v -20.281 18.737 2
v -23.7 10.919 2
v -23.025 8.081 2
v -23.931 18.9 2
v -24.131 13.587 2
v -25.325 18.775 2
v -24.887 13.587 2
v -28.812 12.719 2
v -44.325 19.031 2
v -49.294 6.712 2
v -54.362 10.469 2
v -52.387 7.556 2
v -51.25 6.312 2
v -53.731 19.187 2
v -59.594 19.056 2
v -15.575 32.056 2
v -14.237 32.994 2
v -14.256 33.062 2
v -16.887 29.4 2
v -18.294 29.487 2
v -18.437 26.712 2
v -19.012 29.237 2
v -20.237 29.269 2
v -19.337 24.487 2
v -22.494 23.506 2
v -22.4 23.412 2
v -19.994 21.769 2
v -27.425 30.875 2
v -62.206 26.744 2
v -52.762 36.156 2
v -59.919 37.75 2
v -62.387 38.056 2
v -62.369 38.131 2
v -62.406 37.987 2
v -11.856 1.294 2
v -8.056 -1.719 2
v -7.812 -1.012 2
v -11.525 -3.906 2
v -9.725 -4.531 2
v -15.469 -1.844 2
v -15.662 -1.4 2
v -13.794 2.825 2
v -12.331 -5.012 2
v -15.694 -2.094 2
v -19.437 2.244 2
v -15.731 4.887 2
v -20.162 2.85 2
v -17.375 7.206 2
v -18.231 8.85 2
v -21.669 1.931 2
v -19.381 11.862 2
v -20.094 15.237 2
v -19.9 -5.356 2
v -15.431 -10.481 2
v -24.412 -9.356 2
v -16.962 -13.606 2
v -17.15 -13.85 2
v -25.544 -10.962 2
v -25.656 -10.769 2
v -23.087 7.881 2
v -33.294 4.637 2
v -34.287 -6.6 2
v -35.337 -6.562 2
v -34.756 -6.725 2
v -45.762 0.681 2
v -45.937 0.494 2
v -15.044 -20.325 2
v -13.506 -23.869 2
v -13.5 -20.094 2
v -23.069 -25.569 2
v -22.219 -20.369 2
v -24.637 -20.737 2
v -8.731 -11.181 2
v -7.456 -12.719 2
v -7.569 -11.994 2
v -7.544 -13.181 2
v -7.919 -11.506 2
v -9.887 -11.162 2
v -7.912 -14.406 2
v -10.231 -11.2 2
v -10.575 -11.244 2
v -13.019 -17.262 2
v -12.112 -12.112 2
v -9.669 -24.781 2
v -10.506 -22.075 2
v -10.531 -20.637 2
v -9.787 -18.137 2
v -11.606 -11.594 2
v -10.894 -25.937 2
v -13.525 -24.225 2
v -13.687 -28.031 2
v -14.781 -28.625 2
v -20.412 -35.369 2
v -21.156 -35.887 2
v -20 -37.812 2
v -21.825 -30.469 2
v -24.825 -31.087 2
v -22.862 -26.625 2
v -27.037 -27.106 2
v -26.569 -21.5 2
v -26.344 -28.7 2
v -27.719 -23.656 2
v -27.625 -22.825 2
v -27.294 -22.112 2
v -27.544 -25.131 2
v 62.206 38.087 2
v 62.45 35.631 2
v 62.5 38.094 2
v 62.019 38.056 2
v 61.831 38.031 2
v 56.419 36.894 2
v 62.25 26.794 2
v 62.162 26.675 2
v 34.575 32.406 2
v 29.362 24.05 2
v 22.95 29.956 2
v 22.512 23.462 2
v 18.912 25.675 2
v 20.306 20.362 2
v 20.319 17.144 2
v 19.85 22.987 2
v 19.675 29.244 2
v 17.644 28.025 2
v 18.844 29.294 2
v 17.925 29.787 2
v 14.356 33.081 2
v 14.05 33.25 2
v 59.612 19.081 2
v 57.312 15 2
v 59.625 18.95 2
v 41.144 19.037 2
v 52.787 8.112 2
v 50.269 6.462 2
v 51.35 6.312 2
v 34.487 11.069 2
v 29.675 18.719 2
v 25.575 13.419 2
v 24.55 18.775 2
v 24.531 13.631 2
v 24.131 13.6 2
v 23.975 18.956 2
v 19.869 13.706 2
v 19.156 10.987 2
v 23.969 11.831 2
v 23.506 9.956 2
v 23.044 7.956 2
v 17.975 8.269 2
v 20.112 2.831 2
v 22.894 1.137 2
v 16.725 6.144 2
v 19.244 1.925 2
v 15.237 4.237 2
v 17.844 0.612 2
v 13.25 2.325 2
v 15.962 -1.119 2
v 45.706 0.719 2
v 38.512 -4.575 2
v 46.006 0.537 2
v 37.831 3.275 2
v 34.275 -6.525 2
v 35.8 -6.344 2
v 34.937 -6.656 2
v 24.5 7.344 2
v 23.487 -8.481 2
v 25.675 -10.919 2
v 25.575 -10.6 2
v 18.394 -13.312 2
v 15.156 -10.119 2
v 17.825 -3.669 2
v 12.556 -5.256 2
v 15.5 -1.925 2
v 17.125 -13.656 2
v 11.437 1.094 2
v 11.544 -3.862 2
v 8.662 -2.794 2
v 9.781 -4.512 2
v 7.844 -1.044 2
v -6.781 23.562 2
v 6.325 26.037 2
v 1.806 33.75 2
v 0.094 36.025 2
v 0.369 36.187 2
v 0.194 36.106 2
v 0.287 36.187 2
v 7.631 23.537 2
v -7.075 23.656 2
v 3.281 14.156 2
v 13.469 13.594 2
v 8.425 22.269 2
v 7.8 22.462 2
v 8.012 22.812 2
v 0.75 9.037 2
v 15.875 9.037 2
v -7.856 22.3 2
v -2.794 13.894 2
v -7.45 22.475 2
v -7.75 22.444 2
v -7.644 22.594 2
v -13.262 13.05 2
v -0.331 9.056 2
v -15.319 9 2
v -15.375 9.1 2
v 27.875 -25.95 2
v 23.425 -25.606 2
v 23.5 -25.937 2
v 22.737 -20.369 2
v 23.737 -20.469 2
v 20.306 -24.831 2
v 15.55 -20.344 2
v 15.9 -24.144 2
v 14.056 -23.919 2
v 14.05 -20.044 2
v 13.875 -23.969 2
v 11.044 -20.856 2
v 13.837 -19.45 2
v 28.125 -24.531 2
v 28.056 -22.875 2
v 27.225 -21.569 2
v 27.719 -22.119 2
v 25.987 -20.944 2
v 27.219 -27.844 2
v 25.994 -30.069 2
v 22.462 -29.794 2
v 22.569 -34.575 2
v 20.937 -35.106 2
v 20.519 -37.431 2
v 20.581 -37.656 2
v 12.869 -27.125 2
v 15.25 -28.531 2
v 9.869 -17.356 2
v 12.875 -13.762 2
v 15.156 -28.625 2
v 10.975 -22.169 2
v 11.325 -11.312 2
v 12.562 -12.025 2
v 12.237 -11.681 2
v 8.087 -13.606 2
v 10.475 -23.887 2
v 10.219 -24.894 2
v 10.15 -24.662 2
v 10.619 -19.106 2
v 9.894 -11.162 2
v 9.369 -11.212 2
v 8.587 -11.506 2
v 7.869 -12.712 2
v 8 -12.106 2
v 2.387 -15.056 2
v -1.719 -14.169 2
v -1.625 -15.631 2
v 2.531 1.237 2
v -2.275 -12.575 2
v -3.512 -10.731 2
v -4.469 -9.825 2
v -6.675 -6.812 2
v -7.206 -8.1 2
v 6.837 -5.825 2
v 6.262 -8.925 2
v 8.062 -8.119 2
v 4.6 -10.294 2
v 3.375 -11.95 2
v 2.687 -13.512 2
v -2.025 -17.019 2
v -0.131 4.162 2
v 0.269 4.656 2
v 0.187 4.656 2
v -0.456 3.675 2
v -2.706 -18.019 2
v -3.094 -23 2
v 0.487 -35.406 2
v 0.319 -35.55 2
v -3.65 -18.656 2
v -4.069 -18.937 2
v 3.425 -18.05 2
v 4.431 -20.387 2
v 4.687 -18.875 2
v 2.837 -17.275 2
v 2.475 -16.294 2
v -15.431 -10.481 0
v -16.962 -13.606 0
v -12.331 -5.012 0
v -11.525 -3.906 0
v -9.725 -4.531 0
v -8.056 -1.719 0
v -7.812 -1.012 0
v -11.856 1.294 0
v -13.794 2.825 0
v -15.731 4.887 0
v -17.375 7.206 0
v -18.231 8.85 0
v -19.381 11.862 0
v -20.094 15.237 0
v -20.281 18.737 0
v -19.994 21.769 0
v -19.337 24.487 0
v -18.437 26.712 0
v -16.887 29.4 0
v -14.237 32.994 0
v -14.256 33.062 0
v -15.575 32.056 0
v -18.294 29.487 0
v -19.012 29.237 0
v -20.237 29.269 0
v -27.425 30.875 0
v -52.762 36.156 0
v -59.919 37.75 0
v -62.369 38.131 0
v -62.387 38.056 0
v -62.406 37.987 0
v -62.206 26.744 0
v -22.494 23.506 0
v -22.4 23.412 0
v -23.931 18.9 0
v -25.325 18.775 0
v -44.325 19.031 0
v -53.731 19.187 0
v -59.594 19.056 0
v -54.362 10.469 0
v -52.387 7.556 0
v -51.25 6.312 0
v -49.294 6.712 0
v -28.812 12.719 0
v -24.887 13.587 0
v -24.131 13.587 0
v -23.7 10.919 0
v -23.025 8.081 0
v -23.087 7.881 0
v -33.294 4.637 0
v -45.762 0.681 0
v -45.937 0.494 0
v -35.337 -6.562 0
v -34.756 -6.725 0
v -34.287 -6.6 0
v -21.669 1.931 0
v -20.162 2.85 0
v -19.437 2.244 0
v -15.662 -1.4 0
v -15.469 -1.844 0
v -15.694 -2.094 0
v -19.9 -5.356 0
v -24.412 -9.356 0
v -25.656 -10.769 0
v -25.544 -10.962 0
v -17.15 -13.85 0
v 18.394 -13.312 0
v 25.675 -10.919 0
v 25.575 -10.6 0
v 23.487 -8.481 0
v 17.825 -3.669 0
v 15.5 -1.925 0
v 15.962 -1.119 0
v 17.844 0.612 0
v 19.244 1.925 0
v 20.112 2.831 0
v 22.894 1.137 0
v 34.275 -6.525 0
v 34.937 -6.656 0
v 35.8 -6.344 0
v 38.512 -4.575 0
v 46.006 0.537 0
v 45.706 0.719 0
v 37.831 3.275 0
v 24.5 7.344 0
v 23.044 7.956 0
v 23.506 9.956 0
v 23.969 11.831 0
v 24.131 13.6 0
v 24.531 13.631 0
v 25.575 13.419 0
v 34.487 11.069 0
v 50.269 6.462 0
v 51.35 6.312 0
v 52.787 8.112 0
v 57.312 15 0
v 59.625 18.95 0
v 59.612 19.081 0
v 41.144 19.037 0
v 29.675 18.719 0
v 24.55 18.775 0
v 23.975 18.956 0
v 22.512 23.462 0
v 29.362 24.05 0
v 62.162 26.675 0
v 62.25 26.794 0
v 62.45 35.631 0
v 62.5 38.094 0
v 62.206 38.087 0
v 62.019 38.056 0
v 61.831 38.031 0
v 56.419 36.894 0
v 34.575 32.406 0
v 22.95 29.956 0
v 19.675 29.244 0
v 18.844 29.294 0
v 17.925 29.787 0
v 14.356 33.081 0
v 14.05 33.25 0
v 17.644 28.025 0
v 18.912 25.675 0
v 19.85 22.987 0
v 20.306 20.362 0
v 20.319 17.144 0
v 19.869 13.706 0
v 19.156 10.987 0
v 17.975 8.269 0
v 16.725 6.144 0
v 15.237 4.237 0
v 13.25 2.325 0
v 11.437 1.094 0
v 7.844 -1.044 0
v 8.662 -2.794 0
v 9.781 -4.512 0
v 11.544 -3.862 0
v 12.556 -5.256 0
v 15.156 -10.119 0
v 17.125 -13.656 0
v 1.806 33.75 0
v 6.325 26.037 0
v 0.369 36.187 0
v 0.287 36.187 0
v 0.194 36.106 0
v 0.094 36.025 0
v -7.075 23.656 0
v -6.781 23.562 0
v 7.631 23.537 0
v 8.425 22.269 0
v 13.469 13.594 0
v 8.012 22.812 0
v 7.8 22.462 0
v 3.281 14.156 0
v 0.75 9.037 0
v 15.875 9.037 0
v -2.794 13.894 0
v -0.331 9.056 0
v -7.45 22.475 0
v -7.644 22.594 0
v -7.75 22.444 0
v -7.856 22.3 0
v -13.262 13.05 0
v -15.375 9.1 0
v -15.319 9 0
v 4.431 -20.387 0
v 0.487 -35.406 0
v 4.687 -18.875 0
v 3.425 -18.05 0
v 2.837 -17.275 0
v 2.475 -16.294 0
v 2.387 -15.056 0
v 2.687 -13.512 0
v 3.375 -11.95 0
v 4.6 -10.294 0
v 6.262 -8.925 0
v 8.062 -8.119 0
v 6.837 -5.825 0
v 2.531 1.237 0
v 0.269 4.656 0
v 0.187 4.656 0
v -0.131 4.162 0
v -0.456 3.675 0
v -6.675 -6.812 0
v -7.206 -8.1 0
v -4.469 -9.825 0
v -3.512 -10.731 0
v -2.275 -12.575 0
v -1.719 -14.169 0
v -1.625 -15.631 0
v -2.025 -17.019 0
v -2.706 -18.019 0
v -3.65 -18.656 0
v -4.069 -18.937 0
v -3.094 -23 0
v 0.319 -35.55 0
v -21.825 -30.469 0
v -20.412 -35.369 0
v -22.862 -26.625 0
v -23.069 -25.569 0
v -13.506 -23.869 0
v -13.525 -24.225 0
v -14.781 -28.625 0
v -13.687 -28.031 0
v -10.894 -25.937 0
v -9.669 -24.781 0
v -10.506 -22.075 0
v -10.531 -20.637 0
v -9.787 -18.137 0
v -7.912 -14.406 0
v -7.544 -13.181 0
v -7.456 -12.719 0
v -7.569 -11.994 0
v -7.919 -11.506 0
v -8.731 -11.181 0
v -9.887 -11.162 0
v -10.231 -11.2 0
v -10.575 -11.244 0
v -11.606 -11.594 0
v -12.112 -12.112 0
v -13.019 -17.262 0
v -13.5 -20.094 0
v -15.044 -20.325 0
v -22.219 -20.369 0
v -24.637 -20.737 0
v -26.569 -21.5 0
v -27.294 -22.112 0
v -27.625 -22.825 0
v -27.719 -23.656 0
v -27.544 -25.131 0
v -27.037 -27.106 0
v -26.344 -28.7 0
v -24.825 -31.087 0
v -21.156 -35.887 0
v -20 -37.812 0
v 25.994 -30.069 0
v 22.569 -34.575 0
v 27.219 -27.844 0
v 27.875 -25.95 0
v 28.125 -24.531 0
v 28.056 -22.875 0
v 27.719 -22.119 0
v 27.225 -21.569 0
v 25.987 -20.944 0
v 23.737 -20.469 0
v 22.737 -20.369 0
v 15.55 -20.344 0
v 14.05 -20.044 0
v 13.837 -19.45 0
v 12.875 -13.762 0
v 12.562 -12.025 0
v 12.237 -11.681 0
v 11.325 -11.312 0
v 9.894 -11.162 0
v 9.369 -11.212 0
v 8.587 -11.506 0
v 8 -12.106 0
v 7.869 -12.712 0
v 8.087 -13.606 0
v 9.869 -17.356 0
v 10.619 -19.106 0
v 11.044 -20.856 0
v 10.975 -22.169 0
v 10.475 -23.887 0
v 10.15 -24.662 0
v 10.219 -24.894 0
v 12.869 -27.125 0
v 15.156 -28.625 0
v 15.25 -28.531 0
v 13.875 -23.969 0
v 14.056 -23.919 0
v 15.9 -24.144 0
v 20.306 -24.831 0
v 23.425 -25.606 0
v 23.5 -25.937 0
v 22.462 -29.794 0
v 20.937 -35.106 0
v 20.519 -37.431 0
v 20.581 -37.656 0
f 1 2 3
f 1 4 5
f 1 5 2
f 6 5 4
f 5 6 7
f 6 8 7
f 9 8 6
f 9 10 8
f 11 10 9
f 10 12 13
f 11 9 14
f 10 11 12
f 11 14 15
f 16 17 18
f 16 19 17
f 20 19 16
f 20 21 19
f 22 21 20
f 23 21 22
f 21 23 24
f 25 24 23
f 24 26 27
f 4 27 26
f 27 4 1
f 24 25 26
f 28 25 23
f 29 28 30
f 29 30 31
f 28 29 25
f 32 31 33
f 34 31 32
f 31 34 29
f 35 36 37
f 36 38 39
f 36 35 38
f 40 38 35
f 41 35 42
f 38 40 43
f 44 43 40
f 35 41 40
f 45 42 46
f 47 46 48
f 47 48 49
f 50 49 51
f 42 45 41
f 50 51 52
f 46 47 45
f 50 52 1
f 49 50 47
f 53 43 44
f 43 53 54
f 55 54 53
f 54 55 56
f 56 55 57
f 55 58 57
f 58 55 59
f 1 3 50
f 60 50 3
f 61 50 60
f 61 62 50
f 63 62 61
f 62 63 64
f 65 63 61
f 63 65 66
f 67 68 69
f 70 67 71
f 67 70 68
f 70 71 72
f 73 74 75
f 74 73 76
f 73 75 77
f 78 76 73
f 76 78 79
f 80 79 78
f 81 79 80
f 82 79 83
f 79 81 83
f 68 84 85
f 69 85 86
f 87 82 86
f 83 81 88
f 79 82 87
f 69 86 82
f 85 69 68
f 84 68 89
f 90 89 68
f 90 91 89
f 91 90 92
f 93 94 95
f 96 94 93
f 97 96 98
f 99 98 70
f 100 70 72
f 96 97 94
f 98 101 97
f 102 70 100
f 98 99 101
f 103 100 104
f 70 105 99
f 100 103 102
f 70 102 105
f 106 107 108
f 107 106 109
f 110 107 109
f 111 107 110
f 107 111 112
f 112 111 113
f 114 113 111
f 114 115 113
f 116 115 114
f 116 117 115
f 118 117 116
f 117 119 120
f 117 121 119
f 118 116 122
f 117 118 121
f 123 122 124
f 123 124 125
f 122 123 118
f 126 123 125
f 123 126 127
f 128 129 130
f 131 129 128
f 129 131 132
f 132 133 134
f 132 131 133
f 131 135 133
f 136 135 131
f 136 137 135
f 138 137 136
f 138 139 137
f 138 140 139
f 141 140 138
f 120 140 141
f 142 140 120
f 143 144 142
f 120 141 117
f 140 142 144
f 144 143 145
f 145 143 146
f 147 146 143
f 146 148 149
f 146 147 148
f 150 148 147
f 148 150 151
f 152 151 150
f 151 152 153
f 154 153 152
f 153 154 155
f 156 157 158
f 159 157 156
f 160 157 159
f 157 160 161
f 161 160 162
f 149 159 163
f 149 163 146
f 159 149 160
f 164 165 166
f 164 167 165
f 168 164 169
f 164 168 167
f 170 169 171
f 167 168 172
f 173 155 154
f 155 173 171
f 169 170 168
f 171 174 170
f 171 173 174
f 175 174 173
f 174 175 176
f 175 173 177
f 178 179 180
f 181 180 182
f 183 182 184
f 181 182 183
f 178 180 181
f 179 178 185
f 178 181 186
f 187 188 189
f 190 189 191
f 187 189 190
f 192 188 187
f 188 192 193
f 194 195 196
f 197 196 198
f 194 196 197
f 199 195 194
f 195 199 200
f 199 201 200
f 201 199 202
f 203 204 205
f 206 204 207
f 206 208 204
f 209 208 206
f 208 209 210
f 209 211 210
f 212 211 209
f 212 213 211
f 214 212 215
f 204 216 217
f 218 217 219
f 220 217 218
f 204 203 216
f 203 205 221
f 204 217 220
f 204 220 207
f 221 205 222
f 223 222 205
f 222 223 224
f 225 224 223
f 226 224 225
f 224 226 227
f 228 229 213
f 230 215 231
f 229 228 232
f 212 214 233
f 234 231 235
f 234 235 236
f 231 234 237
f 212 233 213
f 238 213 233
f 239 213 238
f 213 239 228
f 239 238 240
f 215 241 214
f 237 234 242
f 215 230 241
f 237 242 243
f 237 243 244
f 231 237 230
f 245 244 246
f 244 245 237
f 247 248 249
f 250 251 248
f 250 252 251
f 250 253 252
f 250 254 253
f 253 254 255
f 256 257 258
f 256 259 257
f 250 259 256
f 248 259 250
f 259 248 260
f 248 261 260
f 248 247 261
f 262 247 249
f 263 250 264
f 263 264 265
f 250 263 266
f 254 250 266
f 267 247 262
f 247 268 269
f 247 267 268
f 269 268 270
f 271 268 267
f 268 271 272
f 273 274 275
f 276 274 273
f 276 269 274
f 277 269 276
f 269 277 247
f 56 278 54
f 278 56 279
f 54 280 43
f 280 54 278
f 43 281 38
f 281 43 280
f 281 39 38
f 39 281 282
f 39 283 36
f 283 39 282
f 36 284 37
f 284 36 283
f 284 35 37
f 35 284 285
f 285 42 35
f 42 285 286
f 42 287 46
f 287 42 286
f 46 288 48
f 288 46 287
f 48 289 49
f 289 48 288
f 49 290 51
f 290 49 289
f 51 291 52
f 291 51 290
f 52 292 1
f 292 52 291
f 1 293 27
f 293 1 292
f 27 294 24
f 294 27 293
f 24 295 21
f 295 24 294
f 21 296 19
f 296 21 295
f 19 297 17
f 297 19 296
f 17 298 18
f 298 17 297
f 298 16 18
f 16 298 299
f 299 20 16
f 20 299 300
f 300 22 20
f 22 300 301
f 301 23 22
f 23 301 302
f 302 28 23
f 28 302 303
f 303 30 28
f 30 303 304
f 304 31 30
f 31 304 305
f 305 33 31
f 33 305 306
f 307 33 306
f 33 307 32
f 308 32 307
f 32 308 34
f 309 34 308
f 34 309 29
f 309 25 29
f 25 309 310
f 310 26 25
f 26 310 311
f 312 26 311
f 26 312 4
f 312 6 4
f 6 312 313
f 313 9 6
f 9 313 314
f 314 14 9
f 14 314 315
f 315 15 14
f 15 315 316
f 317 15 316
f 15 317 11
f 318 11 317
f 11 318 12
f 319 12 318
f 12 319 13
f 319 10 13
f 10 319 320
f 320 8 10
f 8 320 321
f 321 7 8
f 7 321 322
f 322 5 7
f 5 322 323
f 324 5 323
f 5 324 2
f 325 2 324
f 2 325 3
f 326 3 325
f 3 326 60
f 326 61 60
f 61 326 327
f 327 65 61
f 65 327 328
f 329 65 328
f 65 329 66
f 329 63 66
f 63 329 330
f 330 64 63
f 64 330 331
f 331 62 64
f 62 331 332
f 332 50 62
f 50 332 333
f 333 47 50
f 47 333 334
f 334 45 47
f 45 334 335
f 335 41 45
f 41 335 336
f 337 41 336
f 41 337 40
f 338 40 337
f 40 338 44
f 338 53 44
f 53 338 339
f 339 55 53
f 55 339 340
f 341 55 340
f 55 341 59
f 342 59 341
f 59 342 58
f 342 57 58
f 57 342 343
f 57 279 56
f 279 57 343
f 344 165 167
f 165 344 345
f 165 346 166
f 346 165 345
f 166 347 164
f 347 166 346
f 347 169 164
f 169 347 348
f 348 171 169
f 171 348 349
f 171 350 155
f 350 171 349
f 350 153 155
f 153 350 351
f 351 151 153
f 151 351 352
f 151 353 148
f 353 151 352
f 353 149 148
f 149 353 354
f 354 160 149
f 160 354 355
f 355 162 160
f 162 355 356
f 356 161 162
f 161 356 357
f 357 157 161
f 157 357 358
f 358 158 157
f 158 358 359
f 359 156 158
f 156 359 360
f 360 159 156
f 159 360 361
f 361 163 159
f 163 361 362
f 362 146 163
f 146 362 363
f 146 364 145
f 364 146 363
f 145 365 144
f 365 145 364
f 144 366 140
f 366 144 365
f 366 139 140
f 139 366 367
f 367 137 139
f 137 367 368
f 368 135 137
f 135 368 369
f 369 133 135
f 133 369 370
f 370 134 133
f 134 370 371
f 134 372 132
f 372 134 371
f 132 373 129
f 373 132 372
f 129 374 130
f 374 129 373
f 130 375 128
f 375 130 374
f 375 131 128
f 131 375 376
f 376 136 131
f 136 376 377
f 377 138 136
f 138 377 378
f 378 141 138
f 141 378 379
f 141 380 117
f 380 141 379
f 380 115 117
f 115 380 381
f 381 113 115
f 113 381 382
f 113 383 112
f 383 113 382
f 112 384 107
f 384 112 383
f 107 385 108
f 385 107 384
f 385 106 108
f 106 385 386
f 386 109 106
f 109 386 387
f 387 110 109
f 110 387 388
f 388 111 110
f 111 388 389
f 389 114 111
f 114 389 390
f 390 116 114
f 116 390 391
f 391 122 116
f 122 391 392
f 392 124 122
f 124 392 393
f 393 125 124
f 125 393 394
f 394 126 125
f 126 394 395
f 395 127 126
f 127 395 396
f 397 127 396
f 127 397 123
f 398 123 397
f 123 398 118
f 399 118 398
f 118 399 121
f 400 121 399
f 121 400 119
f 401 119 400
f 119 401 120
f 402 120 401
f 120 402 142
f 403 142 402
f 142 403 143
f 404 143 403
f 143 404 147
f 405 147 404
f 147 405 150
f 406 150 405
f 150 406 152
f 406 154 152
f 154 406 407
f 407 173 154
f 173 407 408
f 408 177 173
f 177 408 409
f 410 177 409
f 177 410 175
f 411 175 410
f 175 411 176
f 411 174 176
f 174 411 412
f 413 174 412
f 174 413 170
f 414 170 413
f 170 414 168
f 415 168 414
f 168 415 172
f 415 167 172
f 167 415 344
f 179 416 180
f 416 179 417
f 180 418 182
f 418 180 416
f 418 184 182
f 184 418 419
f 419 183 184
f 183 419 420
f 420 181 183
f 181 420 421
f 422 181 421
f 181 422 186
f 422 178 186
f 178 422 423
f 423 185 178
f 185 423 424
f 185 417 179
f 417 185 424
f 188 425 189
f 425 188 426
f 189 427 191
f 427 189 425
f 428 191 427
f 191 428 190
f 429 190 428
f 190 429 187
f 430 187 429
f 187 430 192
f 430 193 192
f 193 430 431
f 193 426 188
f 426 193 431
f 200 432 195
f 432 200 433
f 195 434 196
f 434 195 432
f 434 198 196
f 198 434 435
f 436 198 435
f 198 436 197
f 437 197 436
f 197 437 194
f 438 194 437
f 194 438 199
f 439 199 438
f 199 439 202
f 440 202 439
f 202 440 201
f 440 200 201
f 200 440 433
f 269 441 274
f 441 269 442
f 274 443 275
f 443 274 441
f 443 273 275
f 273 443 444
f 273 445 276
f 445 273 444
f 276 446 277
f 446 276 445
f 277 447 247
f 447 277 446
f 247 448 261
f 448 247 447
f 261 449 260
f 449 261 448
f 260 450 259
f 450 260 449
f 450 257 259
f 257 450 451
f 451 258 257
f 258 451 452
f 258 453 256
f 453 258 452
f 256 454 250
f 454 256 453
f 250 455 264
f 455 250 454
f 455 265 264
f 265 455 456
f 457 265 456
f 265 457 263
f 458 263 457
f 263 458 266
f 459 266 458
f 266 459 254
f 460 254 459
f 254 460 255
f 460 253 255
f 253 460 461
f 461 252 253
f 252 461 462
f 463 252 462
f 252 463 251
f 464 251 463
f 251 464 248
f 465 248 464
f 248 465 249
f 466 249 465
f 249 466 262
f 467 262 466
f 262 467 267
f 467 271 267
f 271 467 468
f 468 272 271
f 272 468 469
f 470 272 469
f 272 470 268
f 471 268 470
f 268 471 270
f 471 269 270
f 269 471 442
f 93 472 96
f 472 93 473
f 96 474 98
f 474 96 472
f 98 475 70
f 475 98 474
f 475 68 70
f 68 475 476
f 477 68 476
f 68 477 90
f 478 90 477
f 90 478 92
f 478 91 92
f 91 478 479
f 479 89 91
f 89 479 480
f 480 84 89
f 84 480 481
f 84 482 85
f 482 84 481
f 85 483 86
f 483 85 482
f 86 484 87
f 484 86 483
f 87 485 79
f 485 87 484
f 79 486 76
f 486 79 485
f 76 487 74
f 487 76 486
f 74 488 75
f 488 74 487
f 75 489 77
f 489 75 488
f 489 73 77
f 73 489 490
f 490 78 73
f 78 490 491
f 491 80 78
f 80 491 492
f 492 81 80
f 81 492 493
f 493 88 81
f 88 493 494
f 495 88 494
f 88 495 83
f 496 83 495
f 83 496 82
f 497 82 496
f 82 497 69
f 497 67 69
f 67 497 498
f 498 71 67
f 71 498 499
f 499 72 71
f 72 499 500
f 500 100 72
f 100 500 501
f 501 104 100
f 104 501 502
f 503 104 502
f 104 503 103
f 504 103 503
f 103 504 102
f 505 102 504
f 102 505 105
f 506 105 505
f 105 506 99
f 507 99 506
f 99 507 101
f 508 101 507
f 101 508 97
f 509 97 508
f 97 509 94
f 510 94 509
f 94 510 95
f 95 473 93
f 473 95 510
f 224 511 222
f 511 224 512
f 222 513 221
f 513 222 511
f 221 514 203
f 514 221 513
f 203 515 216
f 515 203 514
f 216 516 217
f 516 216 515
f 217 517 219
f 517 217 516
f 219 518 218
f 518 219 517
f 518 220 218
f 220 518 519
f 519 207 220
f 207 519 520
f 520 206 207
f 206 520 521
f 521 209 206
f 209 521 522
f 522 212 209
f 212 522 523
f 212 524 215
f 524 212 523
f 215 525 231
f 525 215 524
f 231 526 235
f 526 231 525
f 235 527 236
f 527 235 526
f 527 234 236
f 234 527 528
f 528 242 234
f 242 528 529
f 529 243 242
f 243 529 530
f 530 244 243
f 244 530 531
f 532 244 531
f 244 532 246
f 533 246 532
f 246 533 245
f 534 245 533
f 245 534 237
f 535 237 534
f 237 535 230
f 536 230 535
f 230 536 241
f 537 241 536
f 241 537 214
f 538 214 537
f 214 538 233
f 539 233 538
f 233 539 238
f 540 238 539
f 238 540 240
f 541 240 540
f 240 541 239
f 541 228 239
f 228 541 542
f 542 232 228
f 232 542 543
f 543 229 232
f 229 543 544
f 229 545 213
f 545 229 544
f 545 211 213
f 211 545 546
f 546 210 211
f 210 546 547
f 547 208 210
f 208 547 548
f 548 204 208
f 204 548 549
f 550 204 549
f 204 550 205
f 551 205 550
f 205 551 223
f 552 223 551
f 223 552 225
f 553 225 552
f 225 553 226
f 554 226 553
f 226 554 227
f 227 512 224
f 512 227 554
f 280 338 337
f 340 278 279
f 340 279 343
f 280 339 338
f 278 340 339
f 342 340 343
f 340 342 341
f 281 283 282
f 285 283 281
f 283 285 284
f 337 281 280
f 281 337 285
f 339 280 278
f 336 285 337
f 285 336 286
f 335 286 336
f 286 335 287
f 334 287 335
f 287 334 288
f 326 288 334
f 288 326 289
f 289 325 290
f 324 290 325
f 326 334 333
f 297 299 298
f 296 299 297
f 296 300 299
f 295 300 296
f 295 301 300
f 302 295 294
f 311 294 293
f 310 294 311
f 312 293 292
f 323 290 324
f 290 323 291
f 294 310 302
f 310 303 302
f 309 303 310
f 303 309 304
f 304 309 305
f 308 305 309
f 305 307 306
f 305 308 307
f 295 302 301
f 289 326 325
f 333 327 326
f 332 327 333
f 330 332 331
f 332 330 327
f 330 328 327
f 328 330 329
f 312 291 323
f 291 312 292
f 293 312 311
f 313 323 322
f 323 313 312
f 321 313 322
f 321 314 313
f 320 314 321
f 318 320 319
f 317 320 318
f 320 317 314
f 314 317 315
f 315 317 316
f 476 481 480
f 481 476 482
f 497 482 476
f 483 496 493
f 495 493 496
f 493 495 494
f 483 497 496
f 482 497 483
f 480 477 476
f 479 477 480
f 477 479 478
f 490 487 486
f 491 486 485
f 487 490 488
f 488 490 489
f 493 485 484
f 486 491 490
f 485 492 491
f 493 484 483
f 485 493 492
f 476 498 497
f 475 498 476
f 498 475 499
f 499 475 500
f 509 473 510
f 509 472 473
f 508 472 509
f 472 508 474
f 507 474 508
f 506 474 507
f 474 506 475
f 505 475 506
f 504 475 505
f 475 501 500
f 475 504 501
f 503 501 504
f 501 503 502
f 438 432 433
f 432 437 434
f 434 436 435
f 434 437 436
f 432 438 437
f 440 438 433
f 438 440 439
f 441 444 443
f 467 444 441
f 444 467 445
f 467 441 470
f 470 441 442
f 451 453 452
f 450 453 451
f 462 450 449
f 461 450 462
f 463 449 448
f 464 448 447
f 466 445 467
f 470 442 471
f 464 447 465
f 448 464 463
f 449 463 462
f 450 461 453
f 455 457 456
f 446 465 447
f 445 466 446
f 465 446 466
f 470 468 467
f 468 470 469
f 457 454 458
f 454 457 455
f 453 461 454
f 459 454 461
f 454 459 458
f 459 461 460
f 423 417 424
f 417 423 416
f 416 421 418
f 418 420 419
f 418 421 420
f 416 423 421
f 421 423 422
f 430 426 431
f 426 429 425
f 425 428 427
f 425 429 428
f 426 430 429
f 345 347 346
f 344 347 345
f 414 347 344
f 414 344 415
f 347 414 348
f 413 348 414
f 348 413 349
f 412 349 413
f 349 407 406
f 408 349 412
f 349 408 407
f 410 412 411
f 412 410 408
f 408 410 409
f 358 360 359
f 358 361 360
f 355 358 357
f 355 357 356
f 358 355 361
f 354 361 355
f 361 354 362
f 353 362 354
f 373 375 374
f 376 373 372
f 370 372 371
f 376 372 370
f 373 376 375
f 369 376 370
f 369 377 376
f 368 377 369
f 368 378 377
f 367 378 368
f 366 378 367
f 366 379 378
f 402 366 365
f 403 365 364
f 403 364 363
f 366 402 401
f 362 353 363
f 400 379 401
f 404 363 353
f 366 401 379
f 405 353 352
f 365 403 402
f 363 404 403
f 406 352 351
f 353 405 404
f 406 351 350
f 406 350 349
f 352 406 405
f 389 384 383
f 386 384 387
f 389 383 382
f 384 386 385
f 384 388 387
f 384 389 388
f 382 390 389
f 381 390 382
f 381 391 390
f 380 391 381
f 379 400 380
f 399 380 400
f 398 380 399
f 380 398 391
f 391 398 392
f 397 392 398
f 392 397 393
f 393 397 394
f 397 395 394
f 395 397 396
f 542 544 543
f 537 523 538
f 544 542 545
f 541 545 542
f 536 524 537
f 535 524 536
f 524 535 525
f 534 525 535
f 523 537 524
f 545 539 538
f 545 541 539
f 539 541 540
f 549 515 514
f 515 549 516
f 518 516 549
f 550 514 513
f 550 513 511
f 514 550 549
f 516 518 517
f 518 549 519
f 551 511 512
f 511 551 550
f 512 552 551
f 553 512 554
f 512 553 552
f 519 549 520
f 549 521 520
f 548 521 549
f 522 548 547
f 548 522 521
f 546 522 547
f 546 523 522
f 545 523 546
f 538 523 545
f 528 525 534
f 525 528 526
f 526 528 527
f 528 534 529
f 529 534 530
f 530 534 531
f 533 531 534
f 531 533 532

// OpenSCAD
module 204b989a2698f63a1629d5509ec1a59f_1()
{
 /* Generated by trace2scad version 20150415
    http://aggregate.org/MAKE/TRACE2SCAD/
    Optimized model has 279/3844 original points
 */
 color([0.48, 0.48, 0.48])
 assign(minx=0) /* polygon minx=15 */
 assign(miny=0) /* polygon miny=75 */
 assign(maxx=20000) /* polygon maxx=20000 */
 assign(maxy=12250) /* polygon maxy=12226 */
 assign(dx=maxx-minx)
 assign(dy=maxy-miny)
 assign(maxd=((dx>dy)?dx:dy))
 scale([1/maxd, 1/maxd, 1])
 translate([-minx-dx/2, -miny-dy/2, 0])
 linear_extrude(height=1, convexity=279)
 union() {
  union() {
   polygon([[18,12214],[15,12203],[47,10404],[6401,9886],[6416,9871],[6171,9149],[5948,9129],[2908,9170],[1403,9195],[465,9174],[1302,7800],[1618,7334],[1800,7135],[2113,7199],[5390,8160],[6018,8299],[6139,8299],[6208,7872],[6316,7418],[6306,7386],[4673,6867],[2678,6234],[2650,6204],[4346,5075],[4439,5049],[4514,5069],[6533,6434],[6774,6581],[6890,6484],[7494,5901],[7525,5830],[7489,5790],[6816,5268],[6094,4628],[5895,4402],[5913,4371],[7256,3909],[7286,3948],[7531,4448],[8027,5323],[8156,5500],[8444,5400],[8711,5850],[8750,5963],[8103,6332],[7793,6577],[7483,6907],[7220,7278],[7083,7541],[6899,8023],[6785,8563],[6755,9123],[6801,9608],[6906,10043],[7050,10399],[7298,10829],[7722,11404],[7719,11415],[7508,11254],[7073,10843],[6958,10803],[6762,10808],[5612,11065],[1558,11910],[413,12165],[21,12226]], convexity=24);
   polygon([[19923,12214],[19893,12210],[19027,12028],[15532,11310],[13672,10918],[13148,10804],[13015,10812],[12868,10891],[12297,11418],[12248,11445],[12823,10609],[13026,10233],[13176,9803],[13249,9383],[13251,8868],[13179,8318],[13065,7883],[12876,7448],[12676,7108],[12438,6803],[12120,6497],[11830,6300],[11255,5958],[11386,5678],[11565,5403],[11847,5507],[12009,5284],[12425,4506],[12740,3940],[12943,3995],[14108,4378],[14092,4429],[13758,4768],[12852,5538],[12480,5817],[12554,5946],[12855,6223],[13079,6433],[13218,6578],[13663,6307],[15484,5081],[15590,5060],[15728,5110],[16162,5393],[17361,6211],[17313,6240],[16053,6649],[13920,7300],[13687,7398],[13761,7718],[13835,8018],[13861,8301],[13925,8306],[14092,8272],[15518,7896],[18043,7159],[18216,7135],[18446,7423],[19170,8525],[19540,9157],[19538,9178],[16583,9171],[14748,9120],[13928,9129],[13836,9158],[13602,9879],[14698,9973],[19946,10393],[19960,10412],[19992,11826],[20000,12220],[19953,12219]], convexity=23);
   polygon([[10031,11902],[10015,11889],[8868,9910],[8915,9895],[11221,9891],[11012,10291],[10289,11525],[10059,11915],[10046,11915]], convexity=5);
   polygon([[11265,9747],[11248,9719],[10525,8390],[10120,7571],[12540,7571],[12155,8300],[11348,9688],[11282,9775]], convexity=5);
   polygon([[8760,9716],[8743,9693],[7878,8213],[7540,7581],[7549,7565],[9947,7574],[9553,8348],[8808,9721],[8777,9740]], convexity=6);
   polygon([[9979,6791],[9927,6713],[8932,5035],[8847,4829],[9285,4553],[9438,4408],[9636,4113],[9725,3858],[9740,3624],[9676,3402],[9567,3242],[9416,3140],[9349,3095],[9505,2445],[10051,437],[10078,460],[10709,2863],[10750,3105],[10548,3237],[10454,3361],[10396,3518],[10382,3716],[10430,3963],[10540,4213],[10736,4478],[11002,4697],[11290,4826],[11094,5193],[10405,6323],[10043,6870],[10030,6870]], convexity=10);
   polygon([[8363,4333],[8308,4326],[8143,4270],[8062,4187],[7917,3363],[7840,2910],[7593,2873],[6445,2866],[6058,2807],[5749,2685],[5633,2587],[5580,2473],[5565,2340],[5593,2104],[5674,1788],[5785,1533],[6028,1151],[6615,383],[6800,75],[6734,466],[6508,1250],[6342,1865],[6309,2034],[7839,2306],[7836,2249],[7635,1545],[7810,1640],[8257,1975],[8453,2160],[8319,2593],[8315,2823],[8434,3223],[8734,3820],[8793,4016],[8807,4090],[8789,4206],[8733,4284],[8603,4336],[8418,4339]], convexity=11);
   polygon([[11541,4335],[11499,4331],[11374,4284],[11280,4188],[11259,4091],[11294,3948],[11579,3348],[11699,3068],[11767,2788],[11756,2578],[11676,2303],[11624,2179],[11635,2142],[12059,1785],[12425,1545],[12440,1560],[12220,2290],[12249,2298],[12544,2262],[13249,2152],[13748,2028],[13760,1975],[13594,1358],[13350,508],[13283,136],[13293,100],[13611,593],[14159,1314],[14355,1670],[14460,1973],[14500,2200],[14489,2465],[14435,2586],[14356,2674],[14158,2774],[13798,2850],[13638,2866],[12488,2870],[12248,2918],[12214,3013],[12060,3923],[12010,4201],[11958,4256],[11812,4315],[11583,4339]], convexity=14);
  }
 }
}

module 204b989a2698f63a1629d5509ec1a59f()
{
 /* all layers combined, scaled to within a 1mm cube */
 scale([1, 1, 1/1])
 difference() {
  union() {
   scale([1,1,2]) translate([0,0,-0.5]) 204b989a2698f63a1629d5509ec1a59f_1();
  }
  translate([0,0,-2]) cube([2,2,4],center=true);
 }
}

scale([125, 125, 2]) {
	204b989a2698f63a1629d5509ec1a59f();
}
